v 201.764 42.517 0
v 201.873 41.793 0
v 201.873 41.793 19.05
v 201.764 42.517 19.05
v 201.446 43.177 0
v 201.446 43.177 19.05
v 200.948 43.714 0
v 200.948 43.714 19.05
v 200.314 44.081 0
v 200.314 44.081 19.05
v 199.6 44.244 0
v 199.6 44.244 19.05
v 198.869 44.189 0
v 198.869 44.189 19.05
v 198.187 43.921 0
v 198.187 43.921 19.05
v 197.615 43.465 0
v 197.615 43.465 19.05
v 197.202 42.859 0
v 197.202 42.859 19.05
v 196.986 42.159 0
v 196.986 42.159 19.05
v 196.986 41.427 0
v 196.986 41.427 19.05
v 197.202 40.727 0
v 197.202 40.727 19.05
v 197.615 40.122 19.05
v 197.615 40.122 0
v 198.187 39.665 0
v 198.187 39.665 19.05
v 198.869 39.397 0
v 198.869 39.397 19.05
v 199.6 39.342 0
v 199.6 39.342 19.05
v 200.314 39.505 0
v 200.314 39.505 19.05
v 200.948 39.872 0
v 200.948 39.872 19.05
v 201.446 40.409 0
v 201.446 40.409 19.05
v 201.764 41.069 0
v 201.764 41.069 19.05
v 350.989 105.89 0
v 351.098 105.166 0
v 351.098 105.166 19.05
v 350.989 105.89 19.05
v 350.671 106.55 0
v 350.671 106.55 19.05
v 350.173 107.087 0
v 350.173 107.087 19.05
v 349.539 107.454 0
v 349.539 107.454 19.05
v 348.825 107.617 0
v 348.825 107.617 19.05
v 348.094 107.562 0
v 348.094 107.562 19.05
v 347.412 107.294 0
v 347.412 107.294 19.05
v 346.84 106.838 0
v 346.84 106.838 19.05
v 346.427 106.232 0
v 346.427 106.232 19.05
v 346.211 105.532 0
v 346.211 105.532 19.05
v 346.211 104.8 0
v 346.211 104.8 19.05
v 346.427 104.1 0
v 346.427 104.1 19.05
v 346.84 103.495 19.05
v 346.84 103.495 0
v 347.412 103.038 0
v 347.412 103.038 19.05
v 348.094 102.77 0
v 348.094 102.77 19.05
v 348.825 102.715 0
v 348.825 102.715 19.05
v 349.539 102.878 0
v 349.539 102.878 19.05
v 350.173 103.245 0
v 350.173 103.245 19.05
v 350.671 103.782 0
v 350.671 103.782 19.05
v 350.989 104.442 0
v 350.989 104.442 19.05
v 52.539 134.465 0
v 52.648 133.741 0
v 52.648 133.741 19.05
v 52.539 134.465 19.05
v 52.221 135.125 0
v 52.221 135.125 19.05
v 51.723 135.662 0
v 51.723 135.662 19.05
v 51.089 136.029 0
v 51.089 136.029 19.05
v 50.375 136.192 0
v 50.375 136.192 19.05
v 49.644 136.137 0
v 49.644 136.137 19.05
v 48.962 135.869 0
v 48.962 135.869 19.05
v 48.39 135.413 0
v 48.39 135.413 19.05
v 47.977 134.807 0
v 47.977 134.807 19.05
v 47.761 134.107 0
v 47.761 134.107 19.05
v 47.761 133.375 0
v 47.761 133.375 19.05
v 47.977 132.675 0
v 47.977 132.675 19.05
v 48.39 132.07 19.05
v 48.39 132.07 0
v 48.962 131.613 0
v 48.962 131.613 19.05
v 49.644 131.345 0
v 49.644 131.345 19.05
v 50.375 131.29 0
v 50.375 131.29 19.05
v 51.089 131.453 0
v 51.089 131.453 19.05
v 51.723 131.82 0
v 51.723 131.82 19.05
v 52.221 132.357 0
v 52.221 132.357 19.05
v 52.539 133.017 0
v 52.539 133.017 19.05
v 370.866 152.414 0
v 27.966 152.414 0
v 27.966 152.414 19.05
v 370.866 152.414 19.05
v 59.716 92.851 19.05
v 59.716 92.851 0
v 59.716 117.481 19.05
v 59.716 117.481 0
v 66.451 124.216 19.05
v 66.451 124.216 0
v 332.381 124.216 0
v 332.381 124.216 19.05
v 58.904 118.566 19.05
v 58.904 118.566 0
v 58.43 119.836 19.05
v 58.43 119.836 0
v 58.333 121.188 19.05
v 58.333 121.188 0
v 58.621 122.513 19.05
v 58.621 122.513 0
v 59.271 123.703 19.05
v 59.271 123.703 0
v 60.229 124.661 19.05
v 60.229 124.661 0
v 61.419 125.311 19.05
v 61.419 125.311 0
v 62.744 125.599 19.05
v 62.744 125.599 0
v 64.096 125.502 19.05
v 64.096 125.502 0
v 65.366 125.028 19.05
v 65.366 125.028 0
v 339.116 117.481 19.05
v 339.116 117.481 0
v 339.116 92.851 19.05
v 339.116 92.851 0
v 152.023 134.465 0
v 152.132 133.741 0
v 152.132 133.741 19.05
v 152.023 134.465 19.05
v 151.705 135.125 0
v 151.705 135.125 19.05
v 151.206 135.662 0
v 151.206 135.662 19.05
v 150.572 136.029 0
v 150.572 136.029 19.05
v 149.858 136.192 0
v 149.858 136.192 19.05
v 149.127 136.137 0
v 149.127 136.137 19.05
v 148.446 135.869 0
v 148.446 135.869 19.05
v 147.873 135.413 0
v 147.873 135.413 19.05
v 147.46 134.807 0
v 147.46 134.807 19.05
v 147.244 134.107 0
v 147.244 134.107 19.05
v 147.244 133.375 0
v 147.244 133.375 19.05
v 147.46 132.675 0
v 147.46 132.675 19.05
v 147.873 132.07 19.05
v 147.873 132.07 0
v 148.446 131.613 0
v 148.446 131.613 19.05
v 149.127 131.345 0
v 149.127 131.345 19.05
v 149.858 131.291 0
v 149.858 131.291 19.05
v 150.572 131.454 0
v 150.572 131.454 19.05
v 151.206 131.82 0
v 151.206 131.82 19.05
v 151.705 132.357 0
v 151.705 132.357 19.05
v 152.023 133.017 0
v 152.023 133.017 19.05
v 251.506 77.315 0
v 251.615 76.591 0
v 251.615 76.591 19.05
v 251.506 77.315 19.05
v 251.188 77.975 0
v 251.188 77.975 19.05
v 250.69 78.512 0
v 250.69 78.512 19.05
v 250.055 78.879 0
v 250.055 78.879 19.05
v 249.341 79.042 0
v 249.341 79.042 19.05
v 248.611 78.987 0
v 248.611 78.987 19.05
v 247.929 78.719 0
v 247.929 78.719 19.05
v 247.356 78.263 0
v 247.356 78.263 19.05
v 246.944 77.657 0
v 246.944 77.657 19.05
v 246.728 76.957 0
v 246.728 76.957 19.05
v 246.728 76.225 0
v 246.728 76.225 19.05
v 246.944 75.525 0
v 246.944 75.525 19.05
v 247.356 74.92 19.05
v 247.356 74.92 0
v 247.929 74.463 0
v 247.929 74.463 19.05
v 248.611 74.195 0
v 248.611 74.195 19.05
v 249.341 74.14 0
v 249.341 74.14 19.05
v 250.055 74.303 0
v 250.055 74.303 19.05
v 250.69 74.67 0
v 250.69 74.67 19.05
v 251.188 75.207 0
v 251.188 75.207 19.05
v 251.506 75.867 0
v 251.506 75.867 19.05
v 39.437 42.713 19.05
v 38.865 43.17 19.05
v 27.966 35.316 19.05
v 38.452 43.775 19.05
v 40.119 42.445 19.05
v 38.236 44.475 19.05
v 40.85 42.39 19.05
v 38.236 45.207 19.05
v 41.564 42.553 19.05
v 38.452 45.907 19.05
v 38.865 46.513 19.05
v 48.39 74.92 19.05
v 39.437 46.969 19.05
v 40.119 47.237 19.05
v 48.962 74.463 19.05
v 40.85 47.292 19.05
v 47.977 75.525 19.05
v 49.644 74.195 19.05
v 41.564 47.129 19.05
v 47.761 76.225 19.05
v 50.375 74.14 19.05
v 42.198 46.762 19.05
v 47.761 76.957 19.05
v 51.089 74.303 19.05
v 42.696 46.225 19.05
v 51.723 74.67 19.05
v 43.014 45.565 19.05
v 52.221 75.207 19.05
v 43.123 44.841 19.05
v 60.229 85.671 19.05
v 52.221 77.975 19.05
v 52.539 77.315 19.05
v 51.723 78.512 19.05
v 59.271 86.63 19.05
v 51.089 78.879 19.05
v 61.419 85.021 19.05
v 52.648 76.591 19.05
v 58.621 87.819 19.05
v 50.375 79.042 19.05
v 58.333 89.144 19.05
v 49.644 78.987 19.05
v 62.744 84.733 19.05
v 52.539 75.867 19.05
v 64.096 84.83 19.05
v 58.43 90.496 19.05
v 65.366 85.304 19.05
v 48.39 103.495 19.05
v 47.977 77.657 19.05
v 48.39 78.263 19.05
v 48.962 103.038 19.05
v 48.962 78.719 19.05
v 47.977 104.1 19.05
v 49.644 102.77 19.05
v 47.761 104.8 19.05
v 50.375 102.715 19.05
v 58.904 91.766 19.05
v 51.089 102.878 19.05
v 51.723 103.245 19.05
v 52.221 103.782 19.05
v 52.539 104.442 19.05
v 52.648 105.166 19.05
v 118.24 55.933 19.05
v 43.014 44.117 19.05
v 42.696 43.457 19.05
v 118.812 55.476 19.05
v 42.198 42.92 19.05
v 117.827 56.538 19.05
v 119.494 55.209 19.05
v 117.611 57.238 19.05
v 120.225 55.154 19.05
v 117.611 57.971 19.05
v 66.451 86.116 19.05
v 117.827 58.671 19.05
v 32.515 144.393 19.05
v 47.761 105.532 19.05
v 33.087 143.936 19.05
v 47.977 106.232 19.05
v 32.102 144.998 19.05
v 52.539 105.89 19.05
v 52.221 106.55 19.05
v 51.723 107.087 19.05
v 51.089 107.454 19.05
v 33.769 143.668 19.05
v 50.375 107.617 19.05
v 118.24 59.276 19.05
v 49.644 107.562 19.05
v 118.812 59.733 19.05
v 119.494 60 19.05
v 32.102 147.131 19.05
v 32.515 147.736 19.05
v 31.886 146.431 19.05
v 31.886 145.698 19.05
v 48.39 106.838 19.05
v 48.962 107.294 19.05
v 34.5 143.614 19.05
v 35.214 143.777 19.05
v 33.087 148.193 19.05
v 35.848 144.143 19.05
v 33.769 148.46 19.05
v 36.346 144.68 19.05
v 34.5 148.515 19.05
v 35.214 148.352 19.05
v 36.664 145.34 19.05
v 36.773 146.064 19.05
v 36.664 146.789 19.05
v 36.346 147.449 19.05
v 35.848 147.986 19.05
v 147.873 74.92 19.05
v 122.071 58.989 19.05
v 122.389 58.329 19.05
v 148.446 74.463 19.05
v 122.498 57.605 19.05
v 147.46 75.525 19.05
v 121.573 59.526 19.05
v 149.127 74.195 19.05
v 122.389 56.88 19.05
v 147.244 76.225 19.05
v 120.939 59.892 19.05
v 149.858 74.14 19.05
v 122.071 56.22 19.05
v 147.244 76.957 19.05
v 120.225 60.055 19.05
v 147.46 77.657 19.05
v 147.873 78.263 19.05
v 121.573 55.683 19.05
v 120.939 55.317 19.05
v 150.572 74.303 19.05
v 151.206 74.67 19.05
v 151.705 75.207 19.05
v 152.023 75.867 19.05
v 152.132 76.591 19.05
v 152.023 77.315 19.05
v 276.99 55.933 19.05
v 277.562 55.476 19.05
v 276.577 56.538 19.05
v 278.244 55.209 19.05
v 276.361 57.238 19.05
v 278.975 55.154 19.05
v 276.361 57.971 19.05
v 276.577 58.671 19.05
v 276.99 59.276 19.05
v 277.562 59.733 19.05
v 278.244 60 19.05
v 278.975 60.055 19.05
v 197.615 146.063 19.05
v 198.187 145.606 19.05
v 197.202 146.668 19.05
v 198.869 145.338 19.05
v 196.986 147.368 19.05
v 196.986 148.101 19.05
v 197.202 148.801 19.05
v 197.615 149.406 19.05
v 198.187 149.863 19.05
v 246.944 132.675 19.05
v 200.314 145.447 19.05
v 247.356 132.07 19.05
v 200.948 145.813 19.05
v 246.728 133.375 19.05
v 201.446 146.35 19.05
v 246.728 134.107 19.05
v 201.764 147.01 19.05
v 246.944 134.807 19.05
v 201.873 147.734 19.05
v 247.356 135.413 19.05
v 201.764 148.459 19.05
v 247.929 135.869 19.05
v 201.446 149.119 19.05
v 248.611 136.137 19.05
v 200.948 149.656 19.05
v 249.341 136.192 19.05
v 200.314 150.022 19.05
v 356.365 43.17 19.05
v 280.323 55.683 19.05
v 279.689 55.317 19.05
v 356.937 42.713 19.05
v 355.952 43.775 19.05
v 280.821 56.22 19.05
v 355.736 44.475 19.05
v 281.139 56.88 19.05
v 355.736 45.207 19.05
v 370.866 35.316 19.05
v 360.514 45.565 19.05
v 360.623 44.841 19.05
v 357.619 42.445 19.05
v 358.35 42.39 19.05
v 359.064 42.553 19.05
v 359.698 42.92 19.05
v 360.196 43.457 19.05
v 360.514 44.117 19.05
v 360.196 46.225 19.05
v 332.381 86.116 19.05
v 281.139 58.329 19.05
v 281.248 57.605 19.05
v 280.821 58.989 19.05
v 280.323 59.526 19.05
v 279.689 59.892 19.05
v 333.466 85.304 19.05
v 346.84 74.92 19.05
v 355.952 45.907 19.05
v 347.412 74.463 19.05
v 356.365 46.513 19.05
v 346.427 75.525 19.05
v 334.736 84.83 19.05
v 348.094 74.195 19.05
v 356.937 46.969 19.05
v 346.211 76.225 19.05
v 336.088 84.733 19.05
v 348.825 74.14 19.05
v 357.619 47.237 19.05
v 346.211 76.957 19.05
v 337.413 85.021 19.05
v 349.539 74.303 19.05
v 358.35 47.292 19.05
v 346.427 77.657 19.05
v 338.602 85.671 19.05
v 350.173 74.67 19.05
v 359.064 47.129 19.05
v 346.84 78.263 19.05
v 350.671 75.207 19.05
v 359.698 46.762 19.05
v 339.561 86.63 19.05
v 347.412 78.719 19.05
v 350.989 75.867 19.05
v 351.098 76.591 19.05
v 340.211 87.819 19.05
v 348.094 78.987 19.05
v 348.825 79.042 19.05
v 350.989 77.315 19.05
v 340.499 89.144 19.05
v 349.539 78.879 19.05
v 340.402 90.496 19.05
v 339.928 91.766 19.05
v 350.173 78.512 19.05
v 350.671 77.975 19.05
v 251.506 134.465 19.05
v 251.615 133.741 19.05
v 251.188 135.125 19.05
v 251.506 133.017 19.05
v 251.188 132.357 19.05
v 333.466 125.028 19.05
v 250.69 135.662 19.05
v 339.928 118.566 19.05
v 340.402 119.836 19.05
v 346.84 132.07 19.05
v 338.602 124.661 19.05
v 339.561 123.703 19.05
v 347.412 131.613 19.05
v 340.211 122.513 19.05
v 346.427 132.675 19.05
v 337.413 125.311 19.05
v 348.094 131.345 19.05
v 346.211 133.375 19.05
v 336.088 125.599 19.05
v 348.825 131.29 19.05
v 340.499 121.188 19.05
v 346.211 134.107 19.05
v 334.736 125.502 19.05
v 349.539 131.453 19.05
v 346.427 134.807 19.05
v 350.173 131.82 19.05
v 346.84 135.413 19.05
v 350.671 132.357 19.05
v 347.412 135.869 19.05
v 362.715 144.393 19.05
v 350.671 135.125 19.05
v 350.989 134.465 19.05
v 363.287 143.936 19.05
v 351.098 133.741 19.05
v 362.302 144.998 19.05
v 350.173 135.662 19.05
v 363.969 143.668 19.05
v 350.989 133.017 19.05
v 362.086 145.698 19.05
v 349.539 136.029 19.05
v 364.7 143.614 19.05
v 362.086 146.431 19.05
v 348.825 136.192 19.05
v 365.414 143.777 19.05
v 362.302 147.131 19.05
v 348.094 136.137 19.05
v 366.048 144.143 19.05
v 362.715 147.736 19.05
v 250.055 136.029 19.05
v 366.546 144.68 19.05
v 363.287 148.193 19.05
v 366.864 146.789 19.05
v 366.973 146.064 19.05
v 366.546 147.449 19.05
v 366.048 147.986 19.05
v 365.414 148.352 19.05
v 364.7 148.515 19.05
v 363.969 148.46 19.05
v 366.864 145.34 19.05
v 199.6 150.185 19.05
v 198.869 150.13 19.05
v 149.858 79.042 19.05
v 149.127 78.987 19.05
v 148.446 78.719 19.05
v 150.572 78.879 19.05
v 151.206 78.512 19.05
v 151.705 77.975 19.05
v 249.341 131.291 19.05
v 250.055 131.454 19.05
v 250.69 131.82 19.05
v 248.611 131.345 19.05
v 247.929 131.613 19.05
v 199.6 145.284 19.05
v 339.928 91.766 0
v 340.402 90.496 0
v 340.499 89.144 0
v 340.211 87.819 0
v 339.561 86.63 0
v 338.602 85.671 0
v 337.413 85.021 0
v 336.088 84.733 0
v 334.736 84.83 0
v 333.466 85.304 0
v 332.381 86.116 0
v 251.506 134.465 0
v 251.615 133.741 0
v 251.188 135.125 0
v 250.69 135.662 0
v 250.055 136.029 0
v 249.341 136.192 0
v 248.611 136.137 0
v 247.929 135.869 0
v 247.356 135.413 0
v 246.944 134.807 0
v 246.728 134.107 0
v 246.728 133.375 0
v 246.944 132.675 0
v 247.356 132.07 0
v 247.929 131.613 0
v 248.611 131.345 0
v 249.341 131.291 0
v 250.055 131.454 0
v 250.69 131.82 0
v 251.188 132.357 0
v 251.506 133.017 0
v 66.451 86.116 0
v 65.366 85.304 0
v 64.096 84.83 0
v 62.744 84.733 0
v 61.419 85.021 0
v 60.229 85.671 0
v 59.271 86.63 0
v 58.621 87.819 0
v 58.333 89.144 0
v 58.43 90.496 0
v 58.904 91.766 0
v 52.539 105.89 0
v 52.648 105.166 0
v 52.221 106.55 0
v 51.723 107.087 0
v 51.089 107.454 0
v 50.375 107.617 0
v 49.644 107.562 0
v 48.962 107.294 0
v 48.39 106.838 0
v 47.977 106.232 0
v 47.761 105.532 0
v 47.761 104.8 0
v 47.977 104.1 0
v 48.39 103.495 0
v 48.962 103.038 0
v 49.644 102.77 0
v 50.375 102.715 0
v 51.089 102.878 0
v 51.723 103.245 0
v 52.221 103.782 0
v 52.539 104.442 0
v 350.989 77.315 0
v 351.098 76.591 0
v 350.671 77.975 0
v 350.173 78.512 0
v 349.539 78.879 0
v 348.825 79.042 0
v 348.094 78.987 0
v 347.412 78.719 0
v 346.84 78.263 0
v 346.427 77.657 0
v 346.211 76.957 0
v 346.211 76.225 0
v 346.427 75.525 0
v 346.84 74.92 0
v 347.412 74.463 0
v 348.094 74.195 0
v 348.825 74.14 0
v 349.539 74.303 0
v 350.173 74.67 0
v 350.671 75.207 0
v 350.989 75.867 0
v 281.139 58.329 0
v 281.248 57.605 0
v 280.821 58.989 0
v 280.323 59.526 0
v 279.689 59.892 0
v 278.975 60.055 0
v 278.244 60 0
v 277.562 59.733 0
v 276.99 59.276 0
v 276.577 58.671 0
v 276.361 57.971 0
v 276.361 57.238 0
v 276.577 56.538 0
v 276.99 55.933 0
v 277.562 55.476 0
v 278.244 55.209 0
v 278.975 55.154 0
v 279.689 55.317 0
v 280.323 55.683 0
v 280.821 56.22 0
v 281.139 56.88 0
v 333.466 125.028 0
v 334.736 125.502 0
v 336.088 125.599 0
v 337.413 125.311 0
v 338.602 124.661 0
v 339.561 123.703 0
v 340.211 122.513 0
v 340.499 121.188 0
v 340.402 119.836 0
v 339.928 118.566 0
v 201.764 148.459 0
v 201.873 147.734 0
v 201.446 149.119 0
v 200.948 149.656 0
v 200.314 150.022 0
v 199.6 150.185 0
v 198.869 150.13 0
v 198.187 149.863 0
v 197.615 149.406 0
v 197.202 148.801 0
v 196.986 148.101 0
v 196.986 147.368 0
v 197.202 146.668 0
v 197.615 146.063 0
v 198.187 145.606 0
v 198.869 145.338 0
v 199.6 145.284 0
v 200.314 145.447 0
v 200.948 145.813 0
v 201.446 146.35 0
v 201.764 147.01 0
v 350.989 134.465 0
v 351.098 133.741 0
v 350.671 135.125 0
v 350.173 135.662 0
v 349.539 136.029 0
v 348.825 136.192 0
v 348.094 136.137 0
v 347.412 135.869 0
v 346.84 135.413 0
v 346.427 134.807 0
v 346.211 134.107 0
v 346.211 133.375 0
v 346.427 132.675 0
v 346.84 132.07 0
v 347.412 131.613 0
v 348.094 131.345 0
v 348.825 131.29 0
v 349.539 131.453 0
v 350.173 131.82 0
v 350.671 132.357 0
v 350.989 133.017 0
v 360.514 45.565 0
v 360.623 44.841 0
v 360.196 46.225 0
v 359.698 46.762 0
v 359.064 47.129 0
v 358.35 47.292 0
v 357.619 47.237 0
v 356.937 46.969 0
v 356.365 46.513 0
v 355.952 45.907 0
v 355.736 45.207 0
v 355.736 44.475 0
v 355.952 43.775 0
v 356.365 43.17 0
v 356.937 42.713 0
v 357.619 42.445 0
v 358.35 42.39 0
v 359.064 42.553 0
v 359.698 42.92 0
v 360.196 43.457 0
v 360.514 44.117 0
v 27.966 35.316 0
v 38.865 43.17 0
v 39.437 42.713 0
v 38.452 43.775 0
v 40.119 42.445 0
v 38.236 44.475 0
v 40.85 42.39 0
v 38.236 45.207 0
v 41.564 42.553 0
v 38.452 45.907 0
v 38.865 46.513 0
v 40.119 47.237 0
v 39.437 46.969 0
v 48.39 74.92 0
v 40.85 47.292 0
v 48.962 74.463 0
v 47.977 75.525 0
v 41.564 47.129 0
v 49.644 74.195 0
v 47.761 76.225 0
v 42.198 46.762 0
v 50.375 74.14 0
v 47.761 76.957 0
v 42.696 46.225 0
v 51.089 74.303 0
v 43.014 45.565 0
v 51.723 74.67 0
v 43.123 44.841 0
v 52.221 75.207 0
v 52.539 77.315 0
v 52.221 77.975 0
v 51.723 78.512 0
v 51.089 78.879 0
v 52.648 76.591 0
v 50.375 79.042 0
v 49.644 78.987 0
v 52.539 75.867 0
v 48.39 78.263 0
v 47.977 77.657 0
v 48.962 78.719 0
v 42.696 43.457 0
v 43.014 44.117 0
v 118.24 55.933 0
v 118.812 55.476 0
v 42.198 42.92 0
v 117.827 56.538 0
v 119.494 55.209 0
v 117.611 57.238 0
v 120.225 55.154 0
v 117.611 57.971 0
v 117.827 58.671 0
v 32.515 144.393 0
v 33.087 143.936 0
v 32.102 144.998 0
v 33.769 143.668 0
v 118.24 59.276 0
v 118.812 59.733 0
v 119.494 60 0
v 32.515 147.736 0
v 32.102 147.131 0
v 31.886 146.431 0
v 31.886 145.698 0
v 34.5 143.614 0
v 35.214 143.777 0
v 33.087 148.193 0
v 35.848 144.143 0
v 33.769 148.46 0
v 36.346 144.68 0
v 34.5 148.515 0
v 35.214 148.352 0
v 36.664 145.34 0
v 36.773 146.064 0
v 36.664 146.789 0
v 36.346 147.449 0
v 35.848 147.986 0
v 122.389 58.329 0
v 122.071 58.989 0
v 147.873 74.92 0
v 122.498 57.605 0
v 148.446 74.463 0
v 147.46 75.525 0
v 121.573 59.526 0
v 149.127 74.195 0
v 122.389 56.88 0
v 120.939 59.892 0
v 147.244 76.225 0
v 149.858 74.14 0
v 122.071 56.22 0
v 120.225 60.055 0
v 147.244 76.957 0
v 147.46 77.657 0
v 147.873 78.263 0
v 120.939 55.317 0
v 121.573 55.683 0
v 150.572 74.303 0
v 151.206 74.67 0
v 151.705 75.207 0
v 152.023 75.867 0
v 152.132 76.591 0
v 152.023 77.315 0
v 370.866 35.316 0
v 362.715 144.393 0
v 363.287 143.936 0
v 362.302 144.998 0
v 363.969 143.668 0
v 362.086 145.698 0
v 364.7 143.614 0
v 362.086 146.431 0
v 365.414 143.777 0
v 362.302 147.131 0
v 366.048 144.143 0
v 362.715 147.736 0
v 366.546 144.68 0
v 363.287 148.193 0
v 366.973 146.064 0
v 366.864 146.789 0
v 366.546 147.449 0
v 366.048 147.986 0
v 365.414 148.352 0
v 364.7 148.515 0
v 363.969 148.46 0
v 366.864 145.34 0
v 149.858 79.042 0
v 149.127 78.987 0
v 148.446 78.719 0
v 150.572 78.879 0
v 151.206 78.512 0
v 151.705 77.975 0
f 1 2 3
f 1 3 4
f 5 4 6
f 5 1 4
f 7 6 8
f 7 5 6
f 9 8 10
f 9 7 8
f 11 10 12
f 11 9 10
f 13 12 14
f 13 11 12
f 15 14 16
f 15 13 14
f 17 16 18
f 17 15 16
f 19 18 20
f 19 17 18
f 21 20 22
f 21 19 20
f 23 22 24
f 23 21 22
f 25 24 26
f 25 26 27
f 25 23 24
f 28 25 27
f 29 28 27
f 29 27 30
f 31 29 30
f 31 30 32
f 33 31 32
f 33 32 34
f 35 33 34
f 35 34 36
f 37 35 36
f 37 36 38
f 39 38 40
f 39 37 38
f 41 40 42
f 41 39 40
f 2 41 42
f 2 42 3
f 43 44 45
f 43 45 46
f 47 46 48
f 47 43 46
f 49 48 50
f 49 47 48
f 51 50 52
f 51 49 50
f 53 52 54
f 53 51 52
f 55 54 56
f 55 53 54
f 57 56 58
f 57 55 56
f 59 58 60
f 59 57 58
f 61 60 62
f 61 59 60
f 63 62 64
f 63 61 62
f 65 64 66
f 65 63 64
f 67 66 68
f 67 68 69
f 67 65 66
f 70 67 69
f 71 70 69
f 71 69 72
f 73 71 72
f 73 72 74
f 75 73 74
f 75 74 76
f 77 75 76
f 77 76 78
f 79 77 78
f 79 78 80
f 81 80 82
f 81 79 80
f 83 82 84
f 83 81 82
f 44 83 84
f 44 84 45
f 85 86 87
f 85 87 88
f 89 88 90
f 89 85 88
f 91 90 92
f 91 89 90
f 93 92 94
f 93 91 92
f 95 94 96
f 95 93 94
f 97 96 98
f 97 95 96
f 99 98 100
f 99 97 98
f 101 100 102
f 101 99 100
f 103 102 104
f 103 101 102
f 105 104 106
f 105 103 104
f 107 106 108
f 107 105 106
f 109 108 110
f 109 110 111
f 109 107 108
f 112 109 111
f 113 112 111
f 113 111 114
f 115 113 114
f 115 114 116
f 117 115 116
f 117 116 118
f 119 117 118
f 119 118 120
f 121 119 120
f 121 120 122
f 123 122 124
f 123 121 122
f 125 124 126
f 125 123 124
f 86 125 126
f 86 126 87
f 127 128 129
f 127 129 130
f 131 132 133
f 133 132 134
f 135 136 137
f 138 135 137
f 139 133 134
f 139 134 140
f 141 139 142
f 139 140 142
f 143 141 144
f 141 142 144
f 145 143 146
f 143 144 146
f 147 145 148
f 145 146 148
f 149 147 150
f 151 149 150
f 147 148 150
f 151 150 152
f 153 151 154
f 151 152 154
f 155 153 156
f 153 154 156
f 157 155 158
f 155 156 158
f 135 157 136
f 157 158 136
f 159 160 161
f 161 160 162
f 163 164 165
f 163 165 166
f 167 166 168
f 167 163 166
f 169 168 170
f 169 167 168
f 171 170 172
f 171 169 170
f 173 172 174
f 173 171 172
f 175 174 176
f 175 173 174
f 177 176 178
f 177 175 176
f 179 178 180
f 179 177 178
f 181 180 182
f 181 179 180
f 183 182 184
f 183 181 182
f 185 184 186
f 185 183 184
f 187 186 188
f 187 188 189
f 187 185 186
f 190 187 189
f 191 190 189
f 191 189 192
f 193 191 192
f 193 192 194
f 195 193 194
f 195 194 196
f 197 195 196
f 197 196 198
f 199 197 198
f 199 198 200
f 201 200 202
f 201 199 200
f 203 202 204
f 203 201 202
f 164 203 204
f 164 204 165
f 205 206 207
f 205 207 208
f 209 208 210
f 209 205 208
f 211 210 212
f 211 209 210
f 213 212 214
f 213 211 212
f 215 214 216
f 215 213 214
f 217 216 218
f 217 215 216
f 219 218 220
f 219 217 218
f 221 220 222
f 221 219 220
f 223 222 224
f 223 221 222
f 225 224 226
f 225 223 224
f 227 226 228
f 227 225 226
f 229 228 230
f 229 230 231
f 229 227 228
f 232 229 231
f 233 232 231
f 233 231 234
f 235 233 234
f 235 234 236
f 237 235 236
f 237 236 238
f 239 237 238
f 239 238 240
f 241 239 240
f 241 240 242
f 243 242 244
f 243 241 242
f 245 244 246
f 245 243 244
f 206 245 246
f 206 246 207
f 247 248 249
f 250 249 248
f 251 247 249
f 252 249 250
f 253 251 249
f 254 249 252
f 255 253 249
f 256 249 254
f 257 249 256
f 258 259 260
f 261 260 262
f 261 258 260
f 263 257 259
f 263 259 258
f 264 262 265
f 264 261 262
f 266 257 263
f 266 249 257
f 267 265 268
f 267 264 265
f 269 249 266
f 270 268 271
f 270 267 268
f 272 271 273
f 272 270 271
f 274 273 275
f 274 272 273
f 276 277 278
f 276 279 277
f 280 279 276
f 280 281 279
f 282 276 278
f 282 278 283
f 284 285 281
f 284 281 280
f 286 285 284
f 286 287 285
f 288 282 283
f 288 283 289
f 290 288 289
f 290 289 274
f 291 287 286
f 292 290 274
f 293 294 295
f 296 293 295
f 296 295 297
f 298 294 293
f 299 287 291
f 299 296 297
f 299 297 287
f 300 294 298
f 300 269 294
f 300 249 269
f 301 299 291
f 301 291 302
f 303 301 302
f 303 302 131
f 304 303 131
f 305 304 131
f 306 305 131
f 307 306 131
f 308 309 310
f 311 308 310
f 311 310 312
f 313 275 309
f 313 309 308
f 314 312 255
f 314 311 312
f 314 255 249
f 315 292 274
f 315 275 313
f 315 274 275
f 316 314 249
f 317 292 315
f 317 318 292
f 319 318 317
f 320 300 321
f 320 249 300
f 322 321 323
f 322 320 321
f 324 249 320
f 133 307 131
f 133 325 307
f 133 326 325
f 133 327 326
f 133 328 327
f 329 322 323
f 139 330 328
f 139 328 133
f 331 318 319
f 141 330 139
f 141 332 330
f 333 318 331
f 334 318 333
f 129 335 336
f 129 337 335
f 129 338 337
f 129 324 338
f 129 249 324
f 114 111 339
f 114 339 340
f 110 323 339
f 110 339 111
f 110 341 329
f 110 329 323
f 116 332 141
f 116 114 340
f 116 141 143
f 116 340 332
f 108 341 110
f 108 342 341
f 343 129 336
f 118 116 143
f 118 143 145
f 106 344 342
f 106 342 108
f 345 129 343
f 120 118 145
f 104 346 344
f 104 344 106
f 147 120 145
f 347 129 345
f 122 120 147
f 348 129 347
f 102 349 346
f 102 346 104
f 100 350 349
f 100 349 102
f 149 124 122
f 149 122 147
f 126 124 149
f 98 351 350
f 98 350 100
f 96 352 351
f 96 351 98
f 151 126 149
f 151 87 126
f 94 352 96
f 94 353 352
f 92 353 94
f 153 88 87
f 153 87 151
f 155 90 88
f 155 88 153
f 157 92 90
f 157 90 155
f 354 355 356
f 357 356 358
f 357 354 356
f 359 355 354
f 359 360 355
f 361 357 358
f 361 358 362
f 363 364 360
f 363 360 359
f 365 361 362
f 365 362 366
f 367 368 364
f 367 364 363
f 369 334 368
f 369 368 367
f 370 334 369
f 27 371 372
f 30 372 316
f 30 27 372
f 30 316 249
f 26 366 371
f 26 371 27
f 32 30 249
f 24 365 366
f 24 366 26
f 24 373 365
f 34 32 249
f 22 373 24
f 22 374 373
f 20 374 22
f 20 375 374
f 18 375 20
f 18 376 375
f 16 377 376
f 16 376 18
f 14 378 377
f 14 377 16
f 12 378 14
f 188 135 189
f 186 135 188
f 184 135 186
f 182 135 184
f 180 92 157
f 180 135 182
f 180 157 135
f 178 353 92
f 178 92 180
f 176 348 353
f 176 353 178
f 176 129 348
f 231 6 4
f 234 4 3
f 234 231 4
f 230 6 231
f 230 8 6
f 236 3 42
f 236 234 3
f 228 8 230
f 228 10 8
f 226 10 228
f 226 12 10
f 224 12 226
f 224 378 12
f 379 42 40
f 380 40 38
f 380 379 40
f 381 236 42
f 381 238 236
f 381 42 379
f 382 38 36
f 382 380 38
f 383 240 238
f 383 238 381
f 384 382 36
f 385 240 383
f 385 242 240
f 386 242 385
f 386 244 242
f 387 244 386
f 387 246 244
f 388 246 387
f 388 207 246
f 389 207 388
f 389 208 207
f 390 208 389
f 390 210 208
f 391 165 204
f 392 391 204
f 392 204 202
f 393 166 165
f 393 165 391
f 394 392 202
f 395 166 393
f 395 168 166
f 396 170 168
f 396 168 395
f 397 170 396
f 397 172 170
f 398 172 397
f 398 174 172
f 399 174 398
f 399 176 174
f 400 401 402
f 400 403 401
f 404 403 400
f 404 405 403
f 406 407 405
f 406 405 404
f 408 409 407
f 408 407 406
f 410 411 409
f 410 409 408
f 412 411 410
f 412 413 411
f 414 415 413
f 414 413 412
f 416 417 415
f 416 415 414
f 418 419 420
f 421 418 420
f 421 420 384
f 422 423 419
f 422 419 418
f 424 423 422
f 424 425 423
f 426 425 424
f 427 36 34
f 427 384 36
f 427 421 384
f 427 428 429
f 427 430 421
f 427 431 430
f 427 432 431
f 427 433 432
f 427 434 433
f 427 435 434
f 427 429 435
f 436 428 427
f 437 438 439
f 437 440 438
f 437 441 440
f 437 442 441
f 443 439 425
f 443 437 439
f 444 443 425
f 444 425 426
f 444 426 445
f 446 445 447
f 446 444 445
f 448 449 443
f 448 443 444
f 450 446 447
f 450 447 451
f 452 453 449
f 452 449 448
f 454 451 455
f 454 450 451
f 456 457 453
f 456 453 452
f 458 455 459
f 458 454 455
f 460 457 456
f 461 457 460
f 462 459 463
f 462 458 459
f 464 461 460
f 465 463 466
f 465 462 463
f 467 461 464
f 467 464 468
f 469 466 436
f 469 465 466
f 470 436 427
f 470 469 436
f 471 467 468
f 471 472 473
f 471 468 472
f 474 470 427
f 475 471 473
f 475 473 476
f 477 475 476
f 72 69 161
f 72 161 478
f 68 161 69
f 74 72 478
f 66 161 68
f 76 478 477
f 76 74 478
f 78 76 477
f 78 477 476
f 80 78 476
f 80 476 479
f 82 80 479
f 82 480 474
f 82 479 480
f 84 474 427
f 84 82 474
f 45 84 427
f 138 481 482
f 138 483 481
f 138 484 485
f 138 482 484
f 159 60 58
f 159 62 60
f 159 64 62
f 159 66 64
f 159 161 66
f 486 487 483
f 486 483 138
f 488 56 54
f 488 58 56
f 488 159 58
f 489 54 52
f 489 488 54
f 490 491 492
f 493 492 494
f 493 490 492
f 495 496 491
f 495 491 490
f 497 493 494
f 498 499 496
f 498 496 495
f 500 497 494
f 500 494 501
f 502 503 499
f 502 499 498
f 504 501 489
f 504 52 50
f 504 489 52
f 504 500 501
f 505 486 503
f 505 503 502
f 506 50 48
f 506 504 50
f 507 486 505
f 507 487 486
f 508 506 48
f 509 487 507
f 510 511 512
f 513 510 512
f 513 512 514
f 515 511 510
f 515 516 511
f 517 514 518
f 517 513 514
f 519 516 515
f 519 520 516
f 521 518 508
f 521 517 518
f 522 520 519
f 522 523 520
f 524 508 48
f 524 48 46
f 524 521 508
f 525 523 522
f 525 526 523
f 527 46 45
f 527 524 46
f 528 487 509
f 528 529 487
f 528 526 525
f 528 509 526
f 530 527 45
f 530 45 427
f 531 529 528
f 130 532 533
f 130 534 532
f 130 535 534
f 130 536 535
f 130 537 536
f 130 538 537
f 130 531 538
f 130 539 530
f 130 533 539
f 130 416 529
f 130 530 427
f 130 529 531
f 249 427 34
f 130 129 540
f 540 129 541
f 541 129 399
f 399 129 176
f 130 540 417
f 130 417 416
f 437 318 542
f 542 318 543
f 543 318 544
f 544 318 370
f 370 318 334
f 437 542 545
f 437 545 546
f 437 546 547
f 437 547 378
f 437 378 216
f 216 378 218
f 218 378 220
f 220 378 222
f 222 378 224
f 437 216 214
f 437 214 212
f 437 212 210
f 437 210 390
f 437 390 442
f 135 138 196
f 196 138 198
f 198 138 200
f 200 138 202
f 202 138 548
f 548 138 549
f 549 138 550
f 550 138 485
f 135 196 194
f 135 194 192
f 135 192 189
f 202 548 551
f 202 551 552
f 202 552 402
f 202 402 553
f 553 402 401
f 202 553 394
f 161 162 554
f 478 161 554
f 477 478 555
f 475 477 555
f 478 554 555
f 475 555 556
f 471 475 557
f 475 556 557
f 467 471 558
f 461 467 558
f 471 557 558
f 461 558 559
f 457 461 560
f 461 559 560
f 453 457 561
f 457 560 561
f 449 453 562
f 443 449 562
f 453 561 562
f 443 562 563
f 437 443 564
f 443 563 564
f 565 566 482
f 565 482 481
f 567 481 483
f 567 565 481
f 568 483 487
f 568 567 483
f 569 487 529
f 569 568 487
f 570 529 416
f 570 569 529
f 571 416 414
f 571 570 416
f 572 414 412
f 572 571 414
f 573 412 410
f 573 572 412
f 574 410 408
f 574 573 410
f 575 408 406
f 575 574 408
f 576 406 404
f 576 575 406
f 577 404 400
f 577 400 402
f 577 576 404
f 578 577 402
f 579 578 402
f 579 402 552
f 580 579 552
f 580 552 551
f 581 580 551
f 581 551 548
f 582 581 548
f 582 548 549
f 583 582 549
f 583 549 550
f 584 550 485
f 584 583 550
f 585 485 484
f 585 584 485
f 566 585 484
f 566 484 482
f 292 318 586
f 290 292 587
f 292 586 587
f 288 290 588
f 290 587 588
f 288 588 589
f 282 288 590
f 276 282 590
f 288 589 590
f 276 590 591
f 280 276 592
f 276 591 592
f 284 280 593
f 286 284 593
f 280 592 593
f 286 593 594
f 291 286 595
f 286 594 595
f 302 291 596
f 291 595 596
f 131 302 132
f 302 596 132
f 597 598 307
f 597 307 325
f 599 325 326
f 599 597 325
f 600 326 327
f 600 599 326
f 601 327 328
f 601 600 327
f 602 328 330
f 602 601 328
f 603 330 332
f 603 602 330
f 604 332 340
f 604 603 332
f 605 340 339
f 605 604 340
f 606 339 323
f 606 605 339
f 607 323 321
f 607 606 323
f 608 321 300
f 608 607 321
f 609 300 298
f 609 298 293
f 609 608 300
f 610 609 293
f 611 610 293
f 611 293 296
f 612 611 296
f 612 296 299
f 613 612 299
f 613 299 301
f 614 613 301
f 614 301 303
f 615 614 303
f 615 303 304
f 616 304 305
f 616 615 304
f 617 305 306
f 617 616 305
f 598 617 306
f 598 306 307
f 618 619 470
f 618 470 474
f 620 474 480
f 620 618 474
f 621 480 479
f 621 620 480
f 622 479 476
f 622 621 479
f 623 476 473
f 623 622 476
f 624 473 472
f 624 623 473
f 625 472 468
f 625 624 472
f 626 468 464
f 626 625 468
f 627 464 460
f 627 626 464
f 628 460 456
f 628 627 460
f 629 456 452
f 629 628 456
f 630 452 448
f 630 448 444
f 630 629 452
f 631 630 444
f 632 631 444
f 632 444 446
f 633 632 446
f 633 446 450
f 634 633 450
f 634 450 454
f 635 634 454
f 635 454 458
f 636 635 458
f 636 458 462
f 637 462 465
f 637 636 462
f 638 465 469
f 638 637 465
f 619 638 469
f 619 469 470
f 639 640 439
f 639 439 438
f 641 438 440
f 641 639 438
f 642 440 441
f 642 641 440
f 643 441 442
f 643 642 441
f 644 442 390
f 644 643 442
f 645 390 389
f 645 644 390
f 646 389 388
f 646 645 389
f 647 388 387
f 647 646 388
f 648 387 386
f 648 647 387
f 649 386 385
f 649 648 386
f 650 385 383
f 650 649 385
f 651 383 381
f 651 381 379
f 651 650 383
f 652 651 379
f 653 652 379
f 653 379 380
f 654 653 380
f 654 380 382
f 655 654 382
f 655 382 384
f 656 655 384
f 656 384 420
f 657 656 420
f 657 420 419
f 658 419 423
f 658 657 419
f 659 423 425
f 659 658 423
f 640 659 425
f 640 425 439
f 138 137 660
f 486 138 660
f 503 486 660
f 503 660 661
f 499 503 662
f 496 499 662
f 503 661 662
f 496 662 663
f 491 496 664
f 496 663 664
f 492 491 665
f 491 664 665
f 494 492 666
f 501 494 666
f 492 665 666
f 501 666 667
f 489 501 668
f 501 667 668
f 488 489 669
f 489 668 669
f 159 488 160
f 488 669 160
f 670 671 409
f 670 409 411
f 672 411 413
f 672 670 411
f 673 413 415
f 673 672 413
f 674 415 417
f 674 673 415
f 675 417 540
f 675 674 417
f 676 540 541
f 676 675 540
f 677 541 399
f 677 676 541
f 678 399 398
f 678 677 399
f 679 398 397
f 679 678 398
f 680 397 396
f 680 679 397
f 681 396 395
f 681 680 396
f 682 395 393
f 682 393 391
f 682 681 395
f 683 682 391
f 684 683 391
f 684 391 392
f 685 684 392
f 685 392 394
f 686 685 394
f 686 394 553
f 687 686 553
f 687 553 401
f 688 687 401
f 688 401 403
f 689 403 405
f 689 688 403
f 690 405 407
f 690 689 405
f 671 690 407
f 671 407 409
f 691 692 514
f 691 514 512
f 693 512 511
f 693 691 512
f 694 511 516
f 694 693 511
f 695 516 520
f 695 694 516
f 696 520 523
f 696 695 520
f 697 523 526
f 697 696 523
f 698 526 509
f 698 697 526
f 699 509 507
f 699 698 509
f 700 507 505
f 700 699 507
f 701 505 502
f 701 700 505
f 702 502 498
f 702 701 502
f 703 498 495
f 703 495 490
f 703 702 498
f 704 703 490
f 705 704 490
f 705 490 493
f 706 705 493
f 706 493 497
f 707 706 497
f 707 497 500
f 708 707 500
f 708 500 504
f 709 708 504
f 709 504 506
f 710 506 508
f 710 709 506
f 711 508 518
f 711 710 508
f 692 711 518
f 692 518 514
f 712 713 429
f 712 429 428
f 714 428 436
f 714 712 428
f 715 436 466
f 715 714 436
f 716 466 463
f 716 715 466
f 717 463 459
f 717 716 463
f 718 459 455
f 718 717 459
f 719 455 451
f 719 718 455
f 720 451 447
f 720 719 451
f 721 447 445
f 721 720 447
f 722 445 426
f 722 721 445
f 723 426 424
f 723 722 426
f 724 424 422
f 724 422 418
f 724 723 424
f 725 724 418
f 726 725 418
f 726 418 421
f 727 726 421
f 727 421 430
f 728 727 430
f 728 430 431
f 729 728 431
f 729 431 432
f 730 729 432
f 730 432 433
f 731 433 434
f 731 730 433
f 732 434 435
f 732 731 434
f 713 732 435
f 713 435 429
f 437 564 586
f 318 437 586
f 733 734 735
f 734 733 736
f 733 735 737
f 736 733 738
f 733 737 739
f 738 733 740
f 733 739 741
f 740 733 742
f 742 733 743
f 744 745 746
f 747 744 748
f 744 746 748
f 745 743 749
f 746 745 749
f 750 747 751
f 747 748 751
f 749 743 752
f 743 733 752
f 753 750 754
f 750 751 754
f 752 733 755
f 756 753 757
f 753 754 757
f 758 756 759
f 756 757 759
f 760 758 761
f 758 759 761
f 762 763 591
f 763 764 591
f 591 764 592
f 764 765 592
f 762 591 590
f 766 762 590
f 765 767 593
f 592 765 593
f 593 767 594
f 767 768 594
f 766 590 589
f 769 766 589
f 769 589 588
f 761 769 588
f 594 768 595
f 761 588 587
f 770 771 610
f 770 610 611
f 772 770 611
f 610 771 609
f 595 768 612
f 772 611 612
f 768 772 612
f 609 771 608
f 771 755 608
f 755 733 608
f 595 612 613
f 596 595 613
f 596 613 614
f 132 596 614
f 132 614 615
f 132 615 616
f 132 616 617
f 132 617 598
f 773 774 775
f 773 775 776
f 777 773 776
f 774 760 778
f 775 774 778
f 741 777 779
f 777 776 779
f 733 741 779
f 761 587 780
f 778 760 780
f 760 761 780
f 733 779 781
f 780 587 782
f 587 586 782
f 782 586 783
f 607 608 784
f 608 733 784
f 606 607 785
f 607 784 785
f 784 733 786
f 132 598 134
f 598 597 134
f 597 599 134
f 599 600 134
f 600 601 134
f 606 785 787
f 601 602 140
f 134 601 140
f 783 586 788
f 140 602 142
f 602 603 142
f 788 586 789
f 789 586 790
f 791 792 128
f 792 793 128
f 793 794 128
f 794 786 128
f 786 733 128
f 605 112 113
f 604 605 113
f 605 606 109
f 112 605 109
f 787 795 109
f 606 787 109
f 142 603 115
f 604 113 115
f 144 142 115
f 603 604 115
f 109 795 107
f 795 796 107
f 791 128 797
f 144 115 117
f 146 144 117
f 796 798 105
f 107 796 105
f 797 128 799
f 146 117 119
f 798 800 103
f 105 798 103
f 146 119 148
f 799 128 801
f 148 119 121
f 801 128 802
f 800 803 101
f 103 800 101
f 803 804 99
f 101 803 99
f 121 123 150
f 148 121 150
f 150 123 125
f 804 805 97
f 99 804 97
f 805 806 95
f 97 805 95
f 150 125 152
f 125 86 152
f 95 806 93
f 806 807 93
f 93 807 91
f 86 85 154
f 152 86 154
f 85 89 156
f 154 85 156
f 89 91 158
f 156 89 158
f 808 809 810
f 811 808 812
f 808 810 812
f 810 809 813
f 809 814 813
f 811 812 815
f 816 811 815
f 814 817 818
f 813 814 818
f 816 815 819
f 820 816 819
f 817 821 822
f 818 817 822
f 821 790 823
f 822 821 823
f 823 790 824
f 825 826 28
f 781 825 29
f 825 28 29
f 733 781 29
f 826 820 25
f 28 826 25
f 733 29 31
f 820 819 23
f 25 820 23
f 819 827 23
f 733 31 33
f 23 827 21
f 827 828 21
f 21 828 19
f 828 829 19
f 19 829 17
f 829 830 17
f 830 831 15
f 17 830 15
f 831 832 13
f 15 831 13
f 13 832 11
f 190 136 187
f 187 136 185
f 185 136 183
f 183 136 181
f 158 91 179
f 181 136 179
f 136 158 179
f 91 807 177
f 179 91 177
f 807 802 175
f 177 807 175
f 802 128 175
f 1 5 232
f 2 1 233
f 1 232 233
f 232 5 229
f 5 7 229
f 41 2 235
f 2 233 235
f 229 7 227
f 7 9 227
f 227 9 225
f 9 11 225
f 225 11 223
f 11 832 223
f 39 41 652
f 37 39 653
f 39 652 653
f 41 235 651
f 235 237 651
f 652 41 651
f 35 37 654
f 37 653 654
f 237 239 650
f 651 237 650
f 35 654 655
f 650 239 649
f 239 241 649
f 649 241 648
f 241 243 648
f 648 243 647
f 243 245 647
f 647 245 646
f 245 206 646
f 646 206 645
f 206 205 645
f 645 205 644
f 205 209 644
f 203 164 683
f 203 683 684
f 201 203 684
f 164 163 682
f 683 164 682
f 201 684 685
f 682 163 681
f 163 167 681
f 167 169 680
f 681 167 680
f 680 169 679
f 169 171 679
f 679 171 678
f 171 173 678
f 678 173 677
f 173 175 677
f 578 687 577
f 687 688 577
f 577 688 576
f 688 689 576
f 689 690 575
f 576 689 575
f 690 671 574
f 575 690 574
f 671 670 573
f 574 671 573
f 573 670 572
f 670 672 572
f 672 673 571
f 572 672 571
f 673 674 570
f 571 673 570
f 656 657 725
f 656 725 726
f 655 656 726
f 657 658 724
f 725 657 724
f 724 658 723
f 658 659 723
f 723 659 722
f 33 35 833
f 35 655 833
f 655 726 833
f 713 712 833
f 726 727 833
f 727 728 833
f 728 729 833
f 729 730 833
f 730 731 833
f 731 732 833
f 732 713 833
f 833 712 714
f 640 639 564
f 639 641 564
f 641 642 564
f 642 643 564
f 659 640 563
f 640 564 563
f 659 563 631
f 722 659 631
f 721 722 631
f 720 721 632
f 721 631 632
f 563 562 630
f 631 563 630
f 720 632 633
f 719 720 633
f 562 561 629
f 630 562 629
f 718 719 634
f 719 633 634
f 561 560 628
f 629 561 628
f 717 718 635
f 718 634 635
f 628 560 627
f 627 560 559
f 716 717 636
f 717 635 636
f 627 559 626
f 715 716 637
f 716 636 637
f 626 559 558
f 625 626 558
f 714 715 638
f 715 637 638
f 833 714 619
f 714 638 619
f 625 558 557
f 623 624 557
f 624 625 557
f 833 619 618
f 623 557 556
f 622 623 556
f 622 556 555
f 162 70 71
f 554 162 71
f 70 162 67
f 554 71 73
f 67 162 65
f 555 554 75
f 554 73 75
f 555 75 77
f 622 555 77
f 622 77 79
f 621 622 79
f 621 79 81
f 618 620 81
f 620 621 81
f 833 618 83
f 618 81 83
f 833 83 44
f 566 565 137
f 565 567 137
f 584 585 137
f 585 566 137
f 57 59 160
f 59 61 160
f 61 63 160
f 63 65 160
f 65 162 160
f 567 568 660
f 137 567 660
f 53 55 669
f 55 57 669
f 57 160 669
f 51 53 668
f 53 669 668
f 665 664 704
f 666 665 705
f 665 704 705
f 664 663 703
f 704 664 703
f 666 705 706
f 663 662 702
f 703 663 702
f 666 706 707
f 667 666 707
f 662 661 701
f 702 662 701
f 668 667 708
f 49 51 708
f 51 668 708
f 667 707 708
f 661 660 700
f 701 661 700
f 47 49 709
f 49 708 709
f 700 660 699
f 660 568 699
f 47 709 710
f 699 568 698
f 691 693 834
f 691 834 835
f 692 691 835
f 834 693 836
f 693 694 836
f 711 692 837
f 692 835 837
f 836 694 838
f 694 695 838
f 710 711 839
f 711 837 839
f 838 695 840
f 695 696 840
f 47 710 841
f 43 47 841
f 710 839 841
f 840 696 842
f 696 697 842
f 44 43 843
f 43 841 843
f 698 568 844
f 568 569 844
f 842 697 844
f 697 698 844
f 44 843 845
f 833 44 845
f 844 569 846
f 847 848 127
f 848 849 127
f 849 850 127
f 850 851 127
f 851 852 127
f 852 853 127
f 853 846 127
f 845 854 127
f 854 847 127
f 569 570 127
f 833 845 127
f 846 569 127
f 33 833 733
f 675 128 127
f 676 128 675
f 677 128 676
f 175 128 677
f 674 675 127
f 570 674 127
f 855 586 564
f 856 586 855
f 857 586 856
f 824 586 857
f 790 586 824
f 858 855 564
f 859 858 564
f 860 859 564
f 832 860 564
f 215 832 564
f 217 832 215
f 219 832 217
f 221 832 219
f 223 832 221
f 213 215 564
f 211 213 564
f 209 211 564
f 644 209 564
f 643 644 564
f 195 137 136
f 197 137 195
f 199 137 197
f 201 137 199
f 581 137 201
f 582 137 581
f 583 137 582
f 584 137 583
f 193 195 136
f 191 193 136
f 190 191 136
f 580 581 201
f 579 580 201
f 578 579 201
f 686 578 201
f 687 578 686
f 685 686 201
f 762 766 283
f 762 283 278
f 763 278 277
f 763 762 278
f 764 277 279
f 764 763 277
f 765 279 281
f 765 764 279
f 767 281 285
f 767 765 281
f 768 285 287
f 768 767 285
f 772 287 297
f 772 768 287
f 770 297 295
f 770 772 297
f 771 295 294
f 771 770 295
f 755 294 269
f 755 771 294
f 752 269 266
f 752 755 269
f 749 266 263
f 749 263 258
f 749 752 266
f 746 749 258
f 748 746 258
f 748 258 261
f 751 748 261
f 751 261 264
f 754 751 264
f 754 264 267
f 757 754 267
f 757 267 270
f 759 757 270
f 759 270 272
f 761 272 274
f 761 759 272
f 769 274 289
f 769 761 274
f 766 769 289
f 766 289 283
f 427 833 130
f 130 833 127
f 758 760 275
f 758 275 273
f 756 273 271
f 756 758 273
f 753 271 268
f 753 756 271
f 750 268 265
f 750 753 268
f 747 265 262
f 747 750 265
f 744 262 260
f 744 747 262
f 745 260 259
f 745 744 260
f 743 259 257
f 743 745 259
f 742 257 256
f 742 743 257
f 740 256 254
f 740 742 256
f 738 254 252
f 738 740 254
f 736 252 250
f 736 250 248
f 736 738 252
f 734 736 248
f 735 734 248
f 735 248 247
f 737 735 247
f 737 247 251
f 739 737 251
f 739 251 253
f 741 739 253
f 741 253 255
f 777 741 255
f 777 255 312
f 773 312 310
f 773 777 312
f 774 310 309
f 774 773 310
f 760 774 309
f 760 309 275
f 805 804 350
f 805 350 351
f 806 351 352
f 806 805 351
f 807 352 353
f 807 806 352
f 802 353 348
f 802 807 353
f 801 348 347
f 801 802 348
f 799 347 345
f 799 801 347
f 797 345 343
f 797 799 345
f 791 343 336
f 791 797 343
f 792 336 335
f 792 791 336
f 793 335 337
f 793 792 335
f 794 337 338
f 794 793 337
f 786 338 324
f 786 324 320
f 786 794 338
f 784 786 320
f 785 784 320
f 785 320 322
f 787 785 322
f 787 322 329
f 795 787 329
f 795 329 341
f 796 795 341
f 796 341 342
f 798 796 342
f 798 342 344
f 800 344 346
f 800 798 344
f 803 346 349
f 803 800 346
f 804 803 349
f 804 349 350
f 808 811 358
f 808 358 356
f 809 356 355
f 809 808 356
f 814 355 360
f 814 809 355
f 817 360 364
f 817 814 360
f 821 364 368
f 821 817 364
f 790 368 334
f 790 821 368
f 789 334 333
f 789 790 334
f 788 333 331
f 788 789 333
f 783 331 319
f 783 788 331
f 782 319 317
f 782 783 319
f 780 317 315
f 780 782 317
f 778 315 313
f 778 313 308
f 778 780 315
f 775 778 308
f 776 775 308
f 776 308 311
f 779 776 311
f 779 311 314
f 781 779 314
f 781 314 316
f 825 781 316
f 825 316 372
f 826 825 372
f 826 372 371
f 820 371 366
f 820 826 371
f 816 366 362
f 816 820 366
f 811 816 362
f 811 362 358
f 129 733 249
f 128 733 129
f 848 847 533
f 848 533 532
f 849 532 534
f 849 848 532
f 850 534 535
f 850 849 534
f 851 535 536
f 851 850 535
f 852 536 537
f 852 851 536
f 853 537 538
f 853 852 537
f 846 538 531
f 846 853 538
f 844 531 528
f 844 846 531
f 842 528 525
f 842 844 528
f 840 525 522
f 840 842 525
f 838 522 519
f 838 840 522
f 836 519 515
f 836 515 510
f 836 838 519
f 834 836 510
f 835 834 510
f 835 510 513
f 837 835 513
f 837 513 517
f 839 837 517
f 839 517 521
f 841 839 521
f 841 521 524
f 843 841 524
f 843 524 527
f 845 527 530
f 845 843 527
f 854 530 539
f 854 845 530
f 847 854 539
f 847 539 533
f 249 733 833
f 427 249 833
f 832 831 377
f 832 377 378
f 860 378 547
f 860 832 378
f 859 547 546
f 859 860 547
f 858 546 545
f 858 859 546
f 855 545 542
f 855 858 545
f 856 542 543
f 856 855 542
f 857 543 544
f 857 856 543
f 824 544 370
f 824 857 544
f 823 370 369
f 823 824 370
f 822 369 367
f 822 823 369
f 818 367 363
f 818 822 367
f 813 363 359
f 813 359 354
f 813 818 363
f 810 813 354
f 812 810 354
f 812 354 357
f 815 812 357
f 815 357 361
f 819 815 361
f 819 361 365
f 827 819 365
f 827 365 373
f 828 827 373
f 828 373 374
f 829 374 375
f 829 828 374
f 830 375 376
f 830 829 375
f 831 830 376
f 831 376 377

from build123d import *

# Parameters (mm, degrees)
F0_W     = 342.899989
F0_H     = 117.098217
F0_R     = 2.45745
F1_DEPTH = 19.05


with BuildPart() as f1:
    # F0 (on Top) → F1 (new body)
    with BuildSketch(Plane.XY):
        with Locations((199.415946, 93.865183)):
            Rectangle(F0_W, F0_H)
        with Locations((40.665952, 44.841074)):
            Circle(F0_R, mode=Mode.SUBTRACT)
        with Locations((120.040969, 57.604564)):
            Circle(F0_R, mode=Mode.SUBTRACT)
        with Locations((50.190963, 76.591074)):
            Circle(F0_R, mode=Mode.SUBTRACT)
        with Locations((149.674294, 76.591074)):
            Circle(F0_R, mode=Mode.SUBTRACT)
        with Locations((199.41597, 41.793069)):
            Circle(F0_R, mode=Mode.SUBTRACT)
        with Locations((278.79097, 57.604569)):
            Circle(F0_R, mode=Mode.SUBTRACT)
        with Locations((358.165952, 44.841074)):
            Circle(F0_R, mode=Mode.SUBTRACT)
        with Locations((249.157646, 76.591074)):
            Circle(F0_R, mode=Mode.SUBTRACT)
        with Locations((348.640962, 76.591074)):
            Circle(F0_R, mode=Mode.SUBTRACT)
        with Locations((50.190963, 105.166074)):
            Circle(F0_R, mode=Mode.SUBTRACT)
        with Locations((50.190963, 133.741074)):
            Circle(F0_R, mode=Mode.SUBTRACT)
        with Locations((34.315952, 146.064291)):
            Circle(F0_R, mode=Mode.SUBTRACT)
        with Locations((149.674294, 133.741081)):
            Circle(F0_R, mode=Mode.SUBTRACT)
        with BuildLine():
            ThreePointArc((66.451155, 86.116074), (59.715963, 86.116074), (59.715963, 92.851266))
            Line((59.715963, 92.851266), (59.715963, 117.480882))
            ThreePointArc((59.715963, 117.480882), (59.715963, 124.216074), (66.451155, 124.216074))
            Line((66.451155, 124.216074), (332.380771, 124.216074))
            ThreePointArc((332.380771, 124.216074), (339.115963, 124.216074), (339.115963, 117.480882))
            Line((339.115963, 117.480882), (339.115963, 92.851266))
            ThreePointArc((339.115963, 92.851266), (339.115963, 86.116074), (332.380771, 86.116074))
            Line((332.380771, 86.116074), (66.451155, 86.116074))
        make_face(mode=Mode.SUBTRACT)
        with Locations((348.640962, 105.166074)):
            Circle(F0_R, mode=Mode.SUBTRACT)
        with Locations((249.157646, 133.741081)):
            Circle(F0_R, mode=Mode.SUBTRACT)
        with Locations((199.415967, 147.734329)):
            Circle(F0_R, mode=Mode.SUBTRACT)
        with Locations((348.640962, 133.741074)):
            Circle(F0_R, mode=Mode.SUBTRACT)
        with Locations((364.515952, 146.064291)):
            Circle(F0_R, mode=Mode.SUBTRACT)
    extrude(amount=F1_DEPTH)


solid = f1.part
